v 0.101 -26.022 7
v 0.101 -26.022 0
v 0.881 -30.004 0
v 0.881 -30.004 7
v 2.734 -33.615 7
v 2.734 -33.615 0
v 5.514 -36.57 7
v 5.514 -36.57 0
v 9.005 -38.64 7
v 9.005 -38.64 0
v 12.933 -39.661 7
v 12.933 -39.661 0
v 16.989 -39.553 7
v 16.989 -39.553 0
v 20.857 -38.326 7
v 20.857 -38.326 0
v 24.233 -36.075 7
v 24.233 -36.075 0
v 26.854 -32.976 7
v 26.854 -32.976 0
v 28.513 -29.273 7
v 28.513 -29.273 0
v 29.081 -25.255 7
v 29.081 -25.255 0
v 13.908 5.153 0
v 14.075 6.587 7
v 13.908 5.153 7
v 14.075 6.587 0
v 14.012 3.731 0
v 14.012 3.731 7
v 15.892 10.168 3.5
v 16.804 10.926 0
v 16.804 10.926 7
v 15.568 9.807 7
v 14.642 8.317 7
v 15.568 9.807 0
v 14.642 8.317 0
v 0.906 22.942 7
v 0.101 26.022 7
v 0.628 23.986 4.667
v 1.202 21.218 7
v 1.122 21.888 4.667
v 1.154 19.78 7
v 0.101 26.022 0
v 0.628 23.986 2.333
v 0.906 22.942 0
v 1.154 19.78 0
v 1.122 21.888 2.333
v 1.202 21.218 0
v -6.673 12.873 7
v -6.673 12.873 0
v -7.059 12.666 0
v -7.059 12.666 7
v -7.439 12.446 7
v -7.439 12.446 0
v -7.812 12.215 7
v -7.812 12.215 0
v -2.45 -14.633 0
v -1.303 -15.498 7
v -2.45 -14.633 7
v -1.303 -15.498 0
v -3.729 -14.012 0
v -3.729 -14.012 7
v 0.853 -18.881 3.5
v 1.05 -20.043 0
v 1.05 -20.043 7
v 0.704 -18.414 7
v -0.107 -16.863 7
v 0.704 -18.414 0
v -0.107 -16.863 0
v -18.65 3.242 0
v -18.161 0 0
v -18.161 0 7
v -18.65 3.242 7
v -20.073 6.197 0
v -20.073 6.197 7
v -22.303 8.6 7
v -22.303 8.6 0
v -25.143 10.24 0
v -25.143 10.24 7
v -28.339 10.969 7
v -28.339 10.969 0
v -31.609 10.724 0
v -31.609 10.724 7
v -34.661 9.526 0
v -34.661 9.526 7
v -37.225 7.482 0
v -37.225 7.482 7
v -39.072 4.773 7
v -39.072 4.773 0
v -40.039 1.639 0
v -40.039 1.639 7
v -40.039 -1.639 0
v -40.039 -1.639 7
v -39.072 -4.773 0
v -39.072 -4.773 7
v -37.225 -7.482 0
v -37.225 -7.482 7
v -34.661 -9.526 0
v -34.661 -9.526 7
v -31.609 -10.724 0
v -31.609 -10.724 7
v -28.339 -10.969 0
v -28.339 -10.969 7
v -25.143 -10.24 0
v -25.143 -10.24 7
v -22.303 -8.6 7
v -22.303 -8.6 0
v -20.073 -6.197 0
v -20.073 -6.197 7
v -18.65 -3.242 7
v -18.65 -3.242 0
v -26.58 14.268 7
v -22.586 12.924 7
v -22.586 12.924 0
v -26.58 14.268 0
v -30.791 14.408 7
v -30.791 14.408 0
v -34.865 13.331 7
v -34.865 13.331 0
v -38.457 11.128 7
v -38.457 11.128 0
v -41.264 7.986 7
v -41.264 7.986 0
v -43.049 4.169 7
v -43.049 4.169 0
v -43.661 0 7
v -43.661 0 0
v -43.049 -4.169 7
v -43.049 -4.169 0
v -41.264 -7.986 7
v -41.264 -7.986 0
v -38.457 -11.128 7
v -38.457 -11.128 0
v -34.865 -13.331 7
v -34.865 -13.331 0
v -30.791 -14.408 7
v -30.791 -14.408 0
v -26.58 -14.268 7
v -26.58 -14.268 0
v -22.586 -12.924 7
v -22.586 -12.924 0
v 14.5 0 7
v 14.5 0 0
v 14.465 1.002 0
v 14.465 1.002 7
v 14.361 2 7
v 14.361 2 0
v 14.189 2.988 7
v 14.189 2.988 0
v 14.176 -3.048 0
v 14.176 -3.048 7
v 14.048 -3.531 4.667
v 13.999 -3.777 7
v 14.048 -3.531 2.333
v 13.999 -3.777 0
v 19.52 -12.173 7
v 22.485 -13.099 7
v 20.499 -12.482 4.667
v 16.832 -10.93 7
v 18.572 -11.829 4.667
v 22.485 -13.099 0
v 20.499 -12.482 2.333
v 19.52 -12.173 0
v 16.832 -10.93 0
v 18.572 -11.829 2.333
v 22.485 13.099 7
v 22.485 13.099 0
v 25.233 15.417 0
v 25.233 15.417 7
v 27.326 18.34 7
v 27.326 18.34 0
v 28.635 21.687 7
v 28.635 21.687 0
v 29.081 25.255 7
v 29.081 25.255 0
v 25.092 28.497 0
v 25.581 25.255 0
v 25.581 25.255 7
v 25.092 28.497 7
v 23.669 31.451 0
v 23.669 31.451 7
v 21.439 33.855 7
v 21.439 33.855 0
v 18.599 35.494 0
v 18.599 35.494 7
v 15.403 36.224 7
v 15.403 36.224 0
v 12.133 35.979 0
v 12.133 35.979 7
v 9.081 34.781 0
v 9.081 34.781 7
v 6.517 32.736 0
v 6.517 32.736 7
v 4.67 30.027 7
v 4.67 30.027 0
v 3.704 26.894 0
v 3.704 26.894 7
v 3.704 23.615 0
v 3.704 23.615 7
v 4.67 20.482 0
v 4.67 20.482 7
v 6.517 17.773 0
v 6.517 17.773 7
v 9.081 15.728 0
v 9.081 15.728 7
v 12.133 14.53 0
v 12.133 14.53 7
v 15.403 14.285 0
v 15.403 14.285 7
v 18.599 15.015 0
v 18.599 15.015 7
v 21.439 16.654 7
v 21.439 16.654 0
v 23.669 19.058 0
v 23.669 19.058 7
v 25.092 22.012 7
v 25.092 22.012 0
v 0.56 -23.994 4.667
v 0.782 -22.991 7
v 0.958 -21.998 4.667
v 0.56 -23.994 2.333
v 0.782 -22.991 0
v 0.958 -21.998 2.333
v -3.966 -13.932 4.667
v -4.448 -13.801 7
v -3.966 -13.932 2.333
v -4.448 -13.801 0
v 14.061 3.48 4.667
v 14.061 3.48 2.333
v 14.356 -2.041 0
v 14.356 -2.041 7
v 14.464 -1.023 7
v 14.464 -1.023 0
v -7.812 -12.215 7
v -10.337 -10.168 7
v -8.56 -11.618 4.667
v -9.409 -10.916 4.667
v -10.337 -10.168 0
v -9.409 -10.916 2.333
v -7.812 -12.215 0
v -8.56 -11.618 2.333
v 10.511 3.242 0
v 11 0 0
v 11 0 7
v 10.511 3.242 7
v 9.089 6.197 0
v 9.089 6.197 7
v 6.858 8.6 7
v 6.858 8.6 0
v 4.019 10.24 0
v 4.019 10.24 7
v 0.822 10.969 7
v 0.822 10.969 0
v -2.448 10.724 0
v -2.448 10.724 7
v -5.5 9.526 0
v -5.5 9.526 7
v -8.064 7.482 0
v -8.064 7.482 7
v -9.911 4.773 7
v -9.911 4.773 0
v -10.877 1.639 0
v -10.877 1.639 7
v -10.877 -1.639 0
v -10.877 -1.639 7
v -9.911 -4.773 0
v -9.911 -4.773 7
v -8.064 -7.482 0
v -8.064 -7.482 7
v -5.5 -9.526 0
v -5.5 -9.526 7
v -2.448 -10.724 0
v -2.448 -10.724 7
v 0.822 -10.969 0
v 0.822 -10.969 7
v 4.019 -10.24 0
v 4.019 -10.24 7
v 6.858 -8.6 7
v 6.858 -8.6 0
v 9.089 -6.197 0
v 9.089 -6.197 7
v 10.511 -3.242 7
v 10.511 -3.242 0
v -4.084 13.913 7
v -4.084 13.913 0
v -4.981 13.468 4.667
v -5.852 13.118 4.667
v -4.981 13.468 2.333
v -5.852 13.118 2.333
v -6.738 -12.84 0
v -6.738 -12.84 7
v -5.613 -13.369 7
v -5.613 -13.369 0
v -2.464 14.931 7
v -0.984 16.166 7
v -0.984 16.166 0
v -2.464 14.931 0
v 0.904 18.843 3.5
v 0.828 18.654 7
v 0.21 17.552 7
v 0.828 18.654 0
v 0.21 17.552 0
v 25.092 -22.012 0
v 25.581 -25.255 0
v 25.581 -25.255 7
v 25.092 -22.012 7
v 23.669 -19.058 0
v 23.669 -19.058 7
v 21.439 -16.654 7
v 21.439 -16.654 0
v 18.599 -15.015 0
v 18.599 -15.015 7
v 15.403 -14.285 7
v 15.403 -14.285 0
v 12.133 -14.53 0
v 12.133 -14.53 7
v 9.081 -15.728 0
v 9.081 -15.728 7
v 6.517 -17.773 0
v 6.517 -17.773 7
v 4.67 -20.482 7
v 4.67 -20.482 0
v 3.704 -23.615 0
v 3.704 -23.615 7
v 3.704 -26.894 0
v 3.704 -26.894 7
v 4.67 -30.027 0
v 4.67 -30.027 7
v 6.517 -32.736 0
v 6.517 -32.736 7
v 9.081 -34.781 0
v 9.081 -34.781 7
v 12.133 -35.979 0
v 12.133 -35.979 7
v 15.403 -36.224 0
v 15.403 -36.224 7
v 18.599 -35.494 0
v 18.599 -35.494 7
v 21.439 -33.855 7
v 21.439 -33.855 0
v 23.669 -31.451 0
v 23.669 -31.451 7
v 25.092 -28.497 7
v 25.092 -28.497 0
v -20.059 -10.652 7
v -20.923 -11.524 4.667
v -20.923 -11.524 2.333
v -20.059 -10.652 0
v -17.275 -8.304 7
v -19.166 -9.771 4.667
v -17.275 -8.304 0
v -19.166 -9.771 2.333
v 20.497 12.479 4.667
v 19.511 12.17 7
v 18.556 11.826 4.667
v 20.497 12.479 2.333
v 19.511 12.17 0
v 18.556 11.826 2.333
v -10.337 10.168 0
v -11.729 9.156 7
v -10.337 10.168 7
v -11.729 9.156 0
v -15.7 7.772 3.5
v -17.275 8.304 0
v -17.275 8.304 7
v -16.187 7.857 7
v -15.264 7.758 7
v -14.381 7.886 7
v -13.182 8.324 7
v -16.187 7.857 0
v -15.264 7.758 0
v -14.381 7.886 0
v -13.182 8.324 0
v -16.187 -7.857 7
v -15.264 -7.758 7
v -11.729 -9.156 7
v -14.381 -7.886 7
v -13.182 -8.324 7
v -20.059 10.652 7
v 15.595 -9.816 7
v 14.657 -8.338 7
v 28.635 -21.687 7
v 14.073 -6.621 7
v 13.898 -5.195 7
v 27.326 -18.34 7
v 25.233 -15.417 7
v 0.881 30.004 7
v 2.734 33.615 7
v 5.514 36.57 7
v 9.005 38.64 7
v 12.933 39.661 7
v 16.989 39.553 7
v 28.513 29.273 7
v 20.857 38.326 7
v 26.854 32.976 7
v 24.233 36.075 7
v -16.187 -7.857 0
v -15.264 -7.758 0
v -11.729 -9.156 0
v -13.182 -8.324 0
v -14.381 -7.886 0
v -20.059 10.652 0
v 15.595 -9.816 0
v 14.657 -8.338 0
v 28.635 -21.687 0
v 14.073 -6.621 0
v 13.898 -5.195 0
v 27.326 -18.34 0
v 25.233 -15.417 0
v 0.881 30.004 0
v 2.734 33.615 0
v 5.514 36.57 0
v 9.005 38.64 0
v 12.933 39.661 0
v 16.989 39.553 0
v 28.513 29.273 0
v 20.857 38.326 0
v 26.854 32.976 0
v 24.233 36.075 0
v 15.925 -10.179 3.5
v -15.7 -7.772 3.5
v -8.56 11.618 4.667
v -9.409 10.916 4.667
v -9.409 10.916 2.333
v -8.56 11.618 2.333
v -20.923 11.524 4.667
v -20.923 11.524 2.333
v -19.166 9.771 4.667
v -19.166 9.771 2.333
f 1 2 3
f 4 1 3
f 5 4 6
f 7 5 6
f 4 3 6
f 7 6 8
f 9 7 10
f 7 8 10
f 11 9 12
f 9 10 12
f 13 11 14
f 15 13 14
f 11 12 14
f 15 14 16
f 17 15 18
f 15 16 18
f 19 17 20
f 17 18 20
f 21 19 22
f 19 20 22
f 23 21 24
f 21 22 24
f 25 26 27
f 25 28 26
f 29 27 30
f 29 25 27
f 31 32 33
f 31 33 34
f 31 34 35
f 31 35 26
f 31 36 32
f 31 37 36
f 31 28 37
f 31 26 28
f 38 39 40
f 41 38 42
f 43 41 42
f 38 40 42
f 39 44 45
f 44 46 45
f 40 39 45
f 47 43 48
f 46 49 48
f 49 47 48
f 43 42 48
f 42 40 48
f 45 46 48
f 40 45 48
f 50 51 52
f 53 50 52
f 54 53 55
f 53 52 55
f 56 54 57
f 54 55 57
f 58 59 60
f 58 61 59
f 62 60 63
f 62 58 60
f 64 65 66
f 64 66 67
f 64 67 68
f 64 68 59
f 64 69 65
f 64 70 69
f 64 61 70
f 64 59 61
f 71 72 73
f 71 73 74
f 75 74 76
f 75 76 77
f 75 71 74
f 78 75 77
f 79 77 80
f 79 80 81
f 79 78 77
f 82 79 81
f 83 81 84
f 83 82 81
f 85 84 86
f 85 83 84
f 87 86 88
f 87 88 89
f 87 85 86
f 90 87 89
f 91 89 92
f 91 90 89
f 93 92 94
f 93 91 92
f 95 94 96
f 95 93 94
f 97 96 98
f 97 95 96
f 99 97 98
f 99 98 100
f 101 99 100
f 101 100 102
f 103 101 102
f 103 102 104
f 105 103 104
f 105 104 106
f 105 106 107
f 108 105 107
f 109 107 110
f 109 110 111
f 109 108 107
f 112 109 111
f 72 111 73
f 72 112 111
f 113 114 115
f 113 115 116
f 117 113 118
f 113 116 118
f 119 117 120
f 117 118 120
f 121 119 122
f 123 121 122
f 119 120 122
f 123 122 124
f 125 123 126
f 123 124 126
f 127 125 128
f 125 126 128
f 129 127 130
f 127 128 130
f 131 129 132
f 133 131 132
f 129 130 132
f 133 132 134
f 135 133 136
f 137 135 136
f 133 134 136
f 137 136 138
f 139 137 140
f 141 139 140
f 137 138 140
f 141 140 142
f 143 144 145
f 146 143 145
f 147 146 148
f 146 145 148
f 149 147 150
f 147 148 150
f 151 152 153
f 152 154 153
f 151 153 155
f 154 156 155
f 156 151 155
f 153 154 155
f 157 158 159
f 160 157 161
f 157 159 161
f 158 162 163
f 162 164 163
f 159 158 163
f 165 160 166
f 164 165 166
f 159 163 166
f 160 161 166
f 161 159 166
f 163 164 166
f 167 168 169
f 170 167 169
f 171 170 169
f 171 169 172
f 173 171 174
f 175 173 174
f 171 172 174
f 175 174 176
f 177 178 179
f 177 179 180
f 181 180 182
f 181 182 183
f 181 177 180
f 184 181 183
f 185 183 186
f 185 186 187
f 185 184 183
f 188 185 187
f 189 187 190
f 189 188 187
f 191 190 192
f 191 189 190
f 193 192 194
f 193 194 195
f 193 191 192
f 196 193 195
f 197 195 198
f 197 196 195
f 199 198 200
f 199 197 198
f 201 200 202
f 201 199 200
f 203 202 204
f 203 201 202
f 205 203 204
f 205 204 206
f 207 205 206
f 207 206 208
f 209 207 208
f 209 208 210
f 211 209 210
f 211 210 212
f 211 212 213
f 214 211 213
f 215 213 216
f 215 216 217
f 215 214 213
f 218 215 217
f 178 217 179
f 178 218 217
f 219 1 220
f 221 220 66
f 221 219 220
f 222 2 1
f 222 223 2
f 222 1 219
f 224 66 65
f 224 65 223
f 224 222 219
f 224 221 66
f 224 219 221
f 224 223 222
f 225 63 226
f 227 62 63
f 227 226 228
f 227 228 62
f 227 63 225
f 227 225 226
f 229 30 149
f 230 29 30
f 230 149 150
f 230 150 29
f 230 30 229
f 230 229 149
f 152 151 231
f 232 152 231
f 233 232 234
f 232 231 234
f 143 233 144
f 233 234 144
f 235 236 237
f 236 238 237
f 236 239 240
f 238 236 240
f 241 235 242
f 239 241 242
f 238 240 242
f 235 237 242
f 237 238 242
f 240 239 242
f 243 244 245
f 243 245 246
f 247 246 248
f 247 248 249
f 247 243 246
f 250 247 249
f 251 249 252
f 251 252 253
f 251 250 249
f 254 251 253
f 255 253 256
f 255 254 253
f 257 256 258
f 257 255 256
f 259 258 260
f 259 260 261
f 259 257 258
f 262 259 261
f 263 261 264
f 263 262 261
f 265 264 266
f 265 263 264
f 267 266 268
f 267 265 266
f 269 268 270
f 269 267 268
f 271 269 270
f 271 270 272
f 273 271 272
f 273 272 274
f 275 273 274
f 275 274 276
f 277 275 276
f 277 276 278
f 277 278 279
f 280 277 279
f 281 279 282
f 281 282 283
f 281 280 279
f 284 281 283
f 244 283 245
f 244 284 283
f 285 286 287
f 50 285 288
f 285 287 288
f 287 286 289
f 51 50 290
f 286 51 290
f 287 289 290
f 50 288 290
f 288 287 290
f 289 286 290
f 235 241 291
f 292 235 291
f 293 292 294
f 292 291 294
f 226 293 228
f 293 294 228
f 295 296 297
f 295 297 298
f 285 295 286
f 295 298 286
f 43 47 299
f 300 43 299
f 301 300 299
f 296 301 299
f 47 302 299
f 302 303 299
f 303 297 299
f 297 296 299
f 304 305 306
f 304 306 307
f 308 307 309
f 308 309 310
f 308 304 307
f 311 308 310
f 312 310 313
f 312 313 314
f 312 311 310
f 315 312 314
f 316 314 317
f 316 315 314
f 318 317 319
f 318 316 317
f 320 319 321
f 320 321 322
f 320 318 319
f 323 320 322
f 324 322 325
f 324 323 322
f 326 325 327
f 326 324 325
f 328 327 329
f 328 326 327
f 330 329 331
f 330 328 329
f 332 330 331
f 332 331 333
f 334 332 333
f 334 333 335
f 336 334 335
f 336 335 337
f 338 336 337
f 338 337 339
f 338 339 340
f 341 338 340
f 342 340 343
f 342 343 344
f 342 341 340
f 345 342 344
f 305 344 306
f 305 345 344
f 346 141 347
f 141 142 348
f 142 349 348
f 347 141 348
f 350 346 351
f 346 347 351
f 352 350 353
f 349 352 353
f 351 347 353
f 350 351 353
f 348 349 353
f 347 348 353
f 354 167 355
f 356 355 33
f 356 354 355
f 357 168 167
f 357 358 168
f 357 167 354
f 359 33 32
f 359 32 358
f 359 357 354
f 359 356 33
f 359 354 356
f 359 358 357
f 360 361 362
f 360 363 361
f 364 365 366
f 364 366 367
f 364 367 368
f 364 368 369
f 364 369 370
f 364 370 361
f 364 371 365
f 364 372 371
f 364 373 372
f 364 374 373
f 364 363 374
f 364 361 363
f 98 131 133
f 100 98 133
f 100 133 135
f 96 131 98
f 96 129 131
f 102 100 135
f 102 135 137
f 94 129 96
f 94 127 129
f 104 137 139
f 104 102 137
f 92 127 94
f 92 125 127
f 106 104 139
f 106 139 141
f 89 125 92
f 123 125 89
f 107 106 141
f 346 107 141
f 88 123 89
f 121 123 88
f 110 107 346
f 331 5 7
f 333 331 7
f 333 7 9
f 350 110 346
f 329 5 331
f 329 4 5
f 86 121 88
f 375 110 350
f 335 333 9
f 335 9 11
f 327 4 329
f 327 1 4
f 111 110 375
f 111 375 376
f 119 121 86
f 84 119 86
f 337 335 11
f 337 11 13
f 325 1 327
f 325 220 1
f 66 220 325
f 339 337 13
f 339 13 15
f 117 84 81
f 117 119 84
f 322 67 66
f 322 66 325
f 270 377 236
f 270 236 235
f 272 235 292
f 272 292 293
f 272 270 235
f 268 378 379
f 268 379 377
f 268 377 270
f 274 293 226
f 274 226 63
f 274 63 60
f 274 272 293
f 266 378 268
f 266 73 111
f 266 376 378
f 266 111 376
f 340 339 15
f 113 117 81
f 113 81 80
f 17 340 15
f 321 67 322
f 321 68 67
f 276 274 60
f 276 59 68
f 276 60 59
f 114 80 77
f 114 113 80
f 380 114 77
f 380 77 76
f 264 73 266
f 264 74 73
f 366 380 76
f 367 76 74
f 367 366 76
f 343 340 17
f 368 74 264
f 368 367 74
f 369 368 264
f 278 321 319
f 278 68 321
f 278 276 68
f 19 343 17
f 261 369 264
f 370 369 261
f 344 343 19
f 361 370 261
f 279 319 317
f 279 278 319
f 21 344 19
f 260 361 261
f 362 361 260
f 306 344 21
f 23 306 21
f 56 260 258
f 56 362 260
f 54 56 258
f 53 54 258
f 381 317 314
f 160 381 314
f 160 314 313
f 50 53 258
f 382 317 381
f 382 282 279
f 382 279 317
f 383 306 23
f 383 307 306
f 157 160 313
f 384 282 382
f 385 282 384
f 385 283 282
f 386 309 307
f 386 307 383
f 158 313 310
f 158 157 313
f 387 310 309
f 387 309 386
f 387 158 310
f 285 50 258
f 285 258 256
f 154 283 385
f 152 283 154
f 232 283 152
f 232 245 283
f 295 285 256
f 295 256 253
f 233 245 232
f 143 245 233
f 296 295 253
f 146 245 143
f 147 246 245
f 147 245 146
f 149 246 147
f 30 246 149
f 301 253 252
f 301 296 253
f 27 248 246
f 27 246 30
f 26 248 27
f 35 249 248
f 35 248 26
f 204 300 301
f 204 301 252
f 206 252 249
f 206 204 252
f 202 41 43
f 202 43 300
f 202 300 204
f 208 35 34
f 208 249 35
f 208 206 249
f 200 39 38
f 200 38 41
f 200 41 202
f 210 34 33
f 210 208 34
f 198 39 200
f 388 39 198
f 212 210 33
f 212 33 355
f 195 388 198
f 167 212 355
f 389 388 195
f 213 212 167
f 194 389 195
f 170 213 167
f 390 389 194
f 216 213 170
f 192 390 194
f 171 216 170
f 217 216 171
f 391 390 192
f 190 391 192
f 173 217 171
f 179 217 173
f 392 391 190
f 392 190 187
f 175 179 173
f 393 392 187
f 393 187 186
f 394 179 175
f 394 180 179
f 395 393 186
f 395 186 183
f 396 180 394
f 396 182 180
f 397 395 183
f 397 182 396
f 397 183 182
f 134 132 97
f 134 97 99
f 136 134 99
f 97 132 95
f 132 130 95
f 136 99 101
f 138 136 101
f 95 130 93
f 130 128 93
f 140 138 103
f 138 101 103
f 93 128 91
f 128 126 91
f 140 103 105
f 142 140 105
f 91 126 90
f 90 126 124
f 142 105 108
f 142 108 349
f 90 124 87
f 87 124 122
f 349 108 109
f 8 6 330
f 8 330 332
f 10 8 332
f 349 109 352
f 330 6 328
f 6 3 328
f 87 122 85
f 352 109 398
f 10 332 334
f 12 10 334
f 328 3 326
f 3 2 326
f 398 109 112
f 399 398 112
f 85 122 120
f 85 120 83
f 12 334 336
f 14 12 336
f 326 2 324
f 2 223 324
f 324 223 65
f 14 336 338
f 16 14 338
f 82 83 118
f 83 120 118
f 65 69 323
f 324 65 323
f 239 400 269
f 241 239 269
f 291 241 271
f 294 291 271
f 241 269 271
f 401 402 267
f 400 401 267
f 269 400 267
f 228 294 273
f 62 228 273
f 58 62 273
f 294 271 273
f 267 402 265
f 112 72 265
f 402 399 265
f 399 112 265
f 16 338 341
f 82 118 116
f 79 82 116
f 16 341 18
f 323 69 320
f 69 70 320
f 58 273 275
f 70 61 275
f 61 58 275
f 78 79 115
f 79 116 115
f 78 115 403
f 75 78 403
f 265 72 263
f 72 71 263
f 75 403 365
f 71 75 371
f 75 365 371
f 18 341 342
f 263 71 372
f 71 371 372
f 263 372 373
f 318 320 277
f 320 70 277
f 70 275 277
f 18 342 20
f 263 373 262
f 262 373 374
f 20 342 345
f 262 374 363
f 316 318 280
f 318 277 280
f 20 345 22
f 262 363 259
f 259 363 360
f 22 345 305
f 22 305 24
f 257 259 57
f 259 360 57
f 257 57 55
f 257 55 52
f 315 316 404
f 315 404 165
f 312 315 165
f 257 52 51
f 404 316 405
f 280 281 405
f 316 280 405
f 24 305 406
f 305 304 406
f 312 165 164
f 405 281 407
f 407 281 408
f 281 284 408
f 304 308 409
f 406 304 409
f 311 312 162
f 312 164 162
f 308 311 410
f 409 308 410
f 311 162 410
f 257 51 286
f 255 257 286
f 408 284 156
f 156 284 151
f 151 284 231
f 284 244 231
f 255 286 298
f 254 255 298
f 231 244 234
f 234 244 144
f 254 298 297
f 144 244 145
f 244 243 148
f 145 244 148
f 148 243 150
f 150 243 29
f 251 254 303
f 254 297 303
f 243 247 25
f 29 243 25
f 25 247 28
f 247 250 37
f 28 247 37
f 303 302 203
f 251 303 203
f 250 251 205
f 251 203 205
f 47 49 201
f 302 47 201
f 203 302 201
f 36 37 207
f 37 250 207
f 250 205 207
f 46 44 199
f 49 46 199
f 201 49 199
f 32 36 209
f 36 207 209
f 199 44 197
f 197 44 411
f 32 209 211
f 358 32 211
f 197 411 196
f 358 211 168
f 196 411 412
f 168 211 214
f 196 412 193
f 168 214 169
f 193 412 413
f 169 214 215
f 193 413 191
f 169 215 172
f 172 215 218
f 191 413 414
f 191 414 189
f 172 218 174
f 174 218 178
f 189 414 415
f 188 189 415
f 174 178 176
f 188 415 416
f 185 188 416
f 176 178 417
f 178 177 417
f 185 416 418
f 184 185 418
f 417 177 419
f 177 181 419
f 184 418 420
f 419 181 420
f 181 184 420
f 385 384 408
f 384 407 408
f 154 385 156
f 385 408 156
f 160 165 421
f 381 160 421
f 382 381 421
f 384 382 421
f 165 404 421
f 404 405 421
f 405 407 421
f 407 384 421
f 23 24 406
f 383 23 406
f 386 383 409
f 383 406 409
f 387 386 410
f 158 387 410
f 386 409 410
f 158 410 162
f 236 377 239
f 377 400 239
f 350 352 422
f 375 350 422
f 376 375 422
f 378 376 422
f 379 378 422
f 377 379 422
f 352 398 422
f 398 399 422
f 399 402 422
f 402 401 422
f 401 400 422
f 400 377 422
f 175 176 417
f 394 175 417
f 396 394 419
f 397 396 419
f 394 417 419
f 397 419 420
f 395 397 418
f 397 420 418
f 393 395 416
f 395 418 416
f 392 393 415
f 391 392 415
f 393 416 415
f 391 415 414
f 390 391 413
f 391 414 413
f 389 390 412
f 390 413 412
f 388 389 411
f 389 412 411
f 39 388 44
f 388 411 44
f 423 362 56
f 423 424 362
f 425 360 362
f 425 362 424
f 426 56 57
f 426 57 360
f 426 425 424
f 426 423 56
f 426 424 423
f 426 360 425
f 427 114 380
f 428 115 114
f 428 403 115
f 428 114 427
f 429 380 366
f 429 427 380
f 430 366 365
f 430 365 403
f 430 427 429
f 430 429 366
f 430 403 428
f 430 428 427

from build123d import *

# Parameters (mm, degrees)
F0_R     = 11
F1_DEPTH = 7


with BuildPart() as f1:
    # F0 (on Top) → F1 (new body)
    with BuildSketch(Plane.XY):
        with BuildLine():
            ThreePointArc((14.1759402298, -3.0483960701), (14.4187574592, -1.5327861344), (14.5, 0))
            ThreePointArc((14.5, 0), (14.421984404, 1.5021204517), (14.188777124, 2.9880769278))
            add(Edge.make_bspline(
                [(14.0117061641, 3.7312317498), (14.0561894605, 3.4787953407), (14.1150221965, 3.2304441785), (14.188777124, 2.9880769278)],
                knots=[0.9498383363, 0.9498383363, 0.9498383363, 0.9498383363, 1, 1, 1, 1], degree=3))
            ThreePointArc((14.0117061641, 3.7312317498), (7.1105429941, 12.6368579295), (-4.0835358776, 13.9131137685))
            add(Edge.make_bspline(
                [(-4.0835358776, 13.9131137685), (-4.9864056262, 13.4237848609), (-5.8861011392, 13.0613615019), (-6.6725668518, 12.8734941492)],
                knots=[0.8398981571, 0.8398981571, 0.8398981571, 0.8398981571, 1, 1, 1, 1], degree=3))
            ThreePointArc((-6.6725668518, 12.8734941492), (-7.25, 12.5573683549), (-7.8124895427, 12.2153594767))
            add(Edge.make_bspline(
                [(-10.3373118209, 10.1680865613), (-9.3752684105, 10.9198780403), (-8.503153556, 11.689001034), (-7.8124895427, 12.2153594767)],
                knots=[0.8153153807, 0.8153153807, 0.8153153807, 0.8153153807, 1, 1, 1, 1], degree=3))
            ThreePointArc((-10.3373118209, 10.1680865613), (-14.5, 0), (-10.3373118209, -10.1680865613))
            add(Edge.make_bspline(
                [(-10.3373118209, -10.1680865613), (-9.3752684105, -10.9198780403), (-8.503153556, -11.689001034), (-7.8124895427, -12.2153594767)],
                knots=[0.8153153807, 0.8153153807, 0.8153153807, 0.8153153807, 1, 1, 1, 1], degree=3))
            ThreePointArc((-7.8124895427, -12.2153594767), (-6.1812855522, -13.1164670899), (-4.4479816774, -13.8009223966))
            add(Edge.make_bspline(
                [(-3.7286645674, -14.0123895373), (-3.9647890084, -13.9271776533), (-4.2049522049, -13.8562123362), (-4.4479816774, -13.8009223966)],
                knots=[0.9507919436, 0.9507919436, 0.9507919436, 0.9507919436, 1, 1, 1, 1], degree=3))
            ThreePointArc((-3.7286645674, -14.0123895373), (7.25, -12.5573683549), (13.9994175907, -3.7770765311))
            add(Edge.make_bspline(
                [(13.9994175907, -3.7770765311), (14.043684155, -3.5299808247), (14.1023079859, -3.2865107369), (14.1759402298, -3.0483960701)],
                knots=[0.9507919436, 0.9507919436, 0.9507919436, 0.9507919436, 1, 1, 1, 1], degree=3))
        make_face()
        Circle(F0_R, mode=Mode.SUBTRACT)
        with BuildLine():
            ThreePointArc((-4.0835358776, 13.9131137685), (7.1105429941, 12.6368579295), (14.0117061641, 3.7312317498))
            add(Edge.make_bspline(
                [(16.8041360144, 10.9260038108), (16.4779875659, 10.7042997166), (14.5192375285, 9.1026767142), (13.6103052967, 6.0091248438), (14.0117061641, 3.7312317498)],
                knots=[0.4134483725, 0.4134483725, 0.4134483725, 0.4134483725, 0.4971979755, 0.9498383363, 0.9498383363, 0.9498383363, 0.9498383363], degree=3))
            ThreePointArc((16.8041360144, 10.9260038108), (7.4408037917, 12.6342244362), (1.1538261794, 19.7801267949))
            add(Edge.make_bspline(
                [(1.1538261794, 19.7801267949), (1.1027747103, 19.4661195397), (0.518142053, 17.2084365704), (-1.9632609294, 15.0622405677), (-4.0835358776, 13.9131137685)],
                knots=[0.4034852163, 0.4034852163, 0.4034852163, 0.4034852163, 0.4639193106, 0.8398981571, 0.8398981571, 0.8398981571, 0.8398981571], degree=3))
        make_face()
        with BuildLine():
            add(Edge.make_bspline(
                [(16.8324180589, -10.9304210804), (16.5090270331, -10.7103658028), (14.5525951809, -9.1161932679), (13.5913899182, -6.0546846446), (13.9994175907, -3.7770765311)],
                knots=[0.4137406454, 0.4137406454, 0.4137406454, 0.4137406454, 0.4972159985, 0.9507919436, 0.9507919436, 0.9507919436, 0.9507919436], degree=3))
            ThreePointArc((13.9994175907, -3.7770765311), (7.25, -12.5573683549), (-3.7286645674, -14.0123895373))
            add(Edge.make_bspline(
                [(1.0498133002, -20.0425121863), (1.0209353525, -19.6524197039), (0.6185573654, -17.1610137516), (-1.552184245, -14.7978312642), (-3.7286645674, -14.0123895373)],
                knots=[0.4137406454, 0.4137406454, 0.4137406454, 0.4137406454, 0.4972159985, 0.9507919436, 0.9507919436, 0.9507919436, 0.9507919436], degree=3))
            ThreePointArc((1.0498133002, -20.0425121863), (7.3307033346, -12.6971506308), (16.8324180589, -10.9304210804))
        make_face()
        with BuildLine():
            ThreePointArc((1.1538261794, 19.7801267949), (7.4408037917, 12.6342244362), (16.8041360144, 10.9260038108))
            add(Edge.make_bspline(
                [(22.4852798786, 13.0985463935), (20.5195105726, 12.423663188), (18.4142397082, 12.0204949315), (16.8041360144, 10.9260038108)],
                knots=[0, 0, 0, 0, 0.4134483725, 0.4134483725, 0.4134483725, 0.4134483725], degree=3))
            ThreePointArc((22.4852798786, 13.0985463935), (27.3256309509, 18.3395482658), (29.0807033346, 25.2545189857))
            ThreePointArc((29.0807033346, 25.2545189857), (14.964626833, 39.7494354307), (0.1010339902, 26.0220967828))
            add(Edge.make_bspline(
                [(0.1010339902, 26.0220967828), (0.5023641828, 24.0338894608), (1.4946687664, 21.8765805705), (1.1538261794, 19.7801267949)],
                knots=[0, 0, 0, 0, 0.4034852163, 0.4034852163, 0.4034852163, 0.4034852163], degree=3))
        make_face()
        with Locations((14.5807033346, 25.2545189857)):
            Circle(F0_R, mode=Mode.SUBTRACT)
        with BuildLine():
            add(Edge.make_bspline(
                [(22.4852798786, -13.0985463935), (20.5122225081, -12.4305468552), (18.4352865313, -12.0211120353), (16.8324180589, -10.9304210804)],
                knots=[0, 0, 0, 0, 0.4137406454, 0.4137406454, 0.4137406454, 0.4137406454], degree=3))
            ThreePointArc((16.8324180589, -10.9304210804), (7.3307033346, -12.6971506308), (1.0498133002, -20.0425121863))
            add(Edge.make_bspline(
                [(0.1010339902, -26.0220967828), (0.5090581055, -23.9793792077), (1.1929451387, -21.9759824798), (1.0498133002, -20.0425121863)],
                knots=[0, 0, 0, 0, 0.4137406454, 0.4137406454, 0.4137406454, 0.4137406454], degree=3))
            ThreePointArc((0.1010339902, -26.0220967828), (14.964626833, -39.7494354307), (29.0807033346, -25.2545189857))
            ThreePointArc((29.0807033346, -25.2545189857), (27.3256309509, -18.3395482658), (22.4852798786, -13.0985463935))
        make_face()
        with Locations((14.5807033346, -25.2545189857)):
            Circle(F0_R, mode=Mode.SUBTRACT)
        with BuildLine():
            ThreePointArc((-10.3373118209, -10.1680865613), (-14.5, 0), (-10.3373118209, 10.1680865613))
            add(Edge.make_bspline(
                [(-17.2748335615, 8.3041784514), (-16.7684606801, 8.0190428188), (-14.5727828059, 7.2074422158), (-12.0132482268, 8.8584214299), (-10.3373118209, 10.1680865613)],
                knots=[0.3927670048, 0.3927670048, 0.3927670048, 0.3927670048, 0.4935838728, 0.8153153807, 0.8153153807, 0.8153153807, 0.8153153807], degree=3))
            ThreePointArc((-17.2748335615, 8.3041784514), (-15.3301863677, 4.3528548067), (-14.6614066693, 0))
            ThreePointArc((-14.6614066693, 0), (-15.3301863677, -4.3528548067), (-17.2748335615, -8.3041784514))
            add(Edge.make_bspline(
                [(-17.2748335615, -8.3041784514), (-16.7684606801, -8.0190428188), (-14.5727828059, -7.2074422158), (-12.0132482268, -8.8584214299), (-10.3373118209, -10.1680865613)],
                knots=[0.3927670048, 0.3927670048, 0.3927670048, 0.3927670048, 0.4935838728, 0.8153153807, 0.8153153807, 0.8153153807, 0.8153153807], degree=3))
        make_face()
        with BuildLine():
            ThreePointArc((-14.6614066693, 0), (-15.3301863677, 4.3528548067), (-17.2748335615, 8.3041784514))
            add(Edge.make_bspline(
                [(-22.5863138688, 12.9235503893), (-20.9547365723, 11.9145258046), (-19.2475843898, 9.4150230013), (-17.2748335615, 8.3041784514)],
                knots=[0, 0, 0, 0, 0.3927670048, 0.3927670048, 0.3927670048, 0.3927670048], degree=3))
            ThreePointArc((-22.5863138688, 12.9235503893), (-43.6614066693, 0), (-22.5863138688, -12.9235503893))
            add(Edge.make_bspline(
                [(-22.5863138688, -12.9235503893), (-20.9547365723, -11.9145258046), (-19.2475843898, -9.4150230013), (-17.2748335615, -8.3041784514)],
                knots=[0, 0, 0, 0, 0.3927670048, 0.3927670048, 0.3927670048, 0.3927670048], degree=3))
            ThreePointArc((-17.2748335615, -8.3041784514), (-15.3301863677, -4.3528548067), (-14.6614066693, 0))
        make_face()
        with Locations((-29.1614066693, 0)):
            Circle(F0_R, mode=Mode.SUBTRACT)
    extrude(amount=F1_DEPTH)


solid = f1.part
